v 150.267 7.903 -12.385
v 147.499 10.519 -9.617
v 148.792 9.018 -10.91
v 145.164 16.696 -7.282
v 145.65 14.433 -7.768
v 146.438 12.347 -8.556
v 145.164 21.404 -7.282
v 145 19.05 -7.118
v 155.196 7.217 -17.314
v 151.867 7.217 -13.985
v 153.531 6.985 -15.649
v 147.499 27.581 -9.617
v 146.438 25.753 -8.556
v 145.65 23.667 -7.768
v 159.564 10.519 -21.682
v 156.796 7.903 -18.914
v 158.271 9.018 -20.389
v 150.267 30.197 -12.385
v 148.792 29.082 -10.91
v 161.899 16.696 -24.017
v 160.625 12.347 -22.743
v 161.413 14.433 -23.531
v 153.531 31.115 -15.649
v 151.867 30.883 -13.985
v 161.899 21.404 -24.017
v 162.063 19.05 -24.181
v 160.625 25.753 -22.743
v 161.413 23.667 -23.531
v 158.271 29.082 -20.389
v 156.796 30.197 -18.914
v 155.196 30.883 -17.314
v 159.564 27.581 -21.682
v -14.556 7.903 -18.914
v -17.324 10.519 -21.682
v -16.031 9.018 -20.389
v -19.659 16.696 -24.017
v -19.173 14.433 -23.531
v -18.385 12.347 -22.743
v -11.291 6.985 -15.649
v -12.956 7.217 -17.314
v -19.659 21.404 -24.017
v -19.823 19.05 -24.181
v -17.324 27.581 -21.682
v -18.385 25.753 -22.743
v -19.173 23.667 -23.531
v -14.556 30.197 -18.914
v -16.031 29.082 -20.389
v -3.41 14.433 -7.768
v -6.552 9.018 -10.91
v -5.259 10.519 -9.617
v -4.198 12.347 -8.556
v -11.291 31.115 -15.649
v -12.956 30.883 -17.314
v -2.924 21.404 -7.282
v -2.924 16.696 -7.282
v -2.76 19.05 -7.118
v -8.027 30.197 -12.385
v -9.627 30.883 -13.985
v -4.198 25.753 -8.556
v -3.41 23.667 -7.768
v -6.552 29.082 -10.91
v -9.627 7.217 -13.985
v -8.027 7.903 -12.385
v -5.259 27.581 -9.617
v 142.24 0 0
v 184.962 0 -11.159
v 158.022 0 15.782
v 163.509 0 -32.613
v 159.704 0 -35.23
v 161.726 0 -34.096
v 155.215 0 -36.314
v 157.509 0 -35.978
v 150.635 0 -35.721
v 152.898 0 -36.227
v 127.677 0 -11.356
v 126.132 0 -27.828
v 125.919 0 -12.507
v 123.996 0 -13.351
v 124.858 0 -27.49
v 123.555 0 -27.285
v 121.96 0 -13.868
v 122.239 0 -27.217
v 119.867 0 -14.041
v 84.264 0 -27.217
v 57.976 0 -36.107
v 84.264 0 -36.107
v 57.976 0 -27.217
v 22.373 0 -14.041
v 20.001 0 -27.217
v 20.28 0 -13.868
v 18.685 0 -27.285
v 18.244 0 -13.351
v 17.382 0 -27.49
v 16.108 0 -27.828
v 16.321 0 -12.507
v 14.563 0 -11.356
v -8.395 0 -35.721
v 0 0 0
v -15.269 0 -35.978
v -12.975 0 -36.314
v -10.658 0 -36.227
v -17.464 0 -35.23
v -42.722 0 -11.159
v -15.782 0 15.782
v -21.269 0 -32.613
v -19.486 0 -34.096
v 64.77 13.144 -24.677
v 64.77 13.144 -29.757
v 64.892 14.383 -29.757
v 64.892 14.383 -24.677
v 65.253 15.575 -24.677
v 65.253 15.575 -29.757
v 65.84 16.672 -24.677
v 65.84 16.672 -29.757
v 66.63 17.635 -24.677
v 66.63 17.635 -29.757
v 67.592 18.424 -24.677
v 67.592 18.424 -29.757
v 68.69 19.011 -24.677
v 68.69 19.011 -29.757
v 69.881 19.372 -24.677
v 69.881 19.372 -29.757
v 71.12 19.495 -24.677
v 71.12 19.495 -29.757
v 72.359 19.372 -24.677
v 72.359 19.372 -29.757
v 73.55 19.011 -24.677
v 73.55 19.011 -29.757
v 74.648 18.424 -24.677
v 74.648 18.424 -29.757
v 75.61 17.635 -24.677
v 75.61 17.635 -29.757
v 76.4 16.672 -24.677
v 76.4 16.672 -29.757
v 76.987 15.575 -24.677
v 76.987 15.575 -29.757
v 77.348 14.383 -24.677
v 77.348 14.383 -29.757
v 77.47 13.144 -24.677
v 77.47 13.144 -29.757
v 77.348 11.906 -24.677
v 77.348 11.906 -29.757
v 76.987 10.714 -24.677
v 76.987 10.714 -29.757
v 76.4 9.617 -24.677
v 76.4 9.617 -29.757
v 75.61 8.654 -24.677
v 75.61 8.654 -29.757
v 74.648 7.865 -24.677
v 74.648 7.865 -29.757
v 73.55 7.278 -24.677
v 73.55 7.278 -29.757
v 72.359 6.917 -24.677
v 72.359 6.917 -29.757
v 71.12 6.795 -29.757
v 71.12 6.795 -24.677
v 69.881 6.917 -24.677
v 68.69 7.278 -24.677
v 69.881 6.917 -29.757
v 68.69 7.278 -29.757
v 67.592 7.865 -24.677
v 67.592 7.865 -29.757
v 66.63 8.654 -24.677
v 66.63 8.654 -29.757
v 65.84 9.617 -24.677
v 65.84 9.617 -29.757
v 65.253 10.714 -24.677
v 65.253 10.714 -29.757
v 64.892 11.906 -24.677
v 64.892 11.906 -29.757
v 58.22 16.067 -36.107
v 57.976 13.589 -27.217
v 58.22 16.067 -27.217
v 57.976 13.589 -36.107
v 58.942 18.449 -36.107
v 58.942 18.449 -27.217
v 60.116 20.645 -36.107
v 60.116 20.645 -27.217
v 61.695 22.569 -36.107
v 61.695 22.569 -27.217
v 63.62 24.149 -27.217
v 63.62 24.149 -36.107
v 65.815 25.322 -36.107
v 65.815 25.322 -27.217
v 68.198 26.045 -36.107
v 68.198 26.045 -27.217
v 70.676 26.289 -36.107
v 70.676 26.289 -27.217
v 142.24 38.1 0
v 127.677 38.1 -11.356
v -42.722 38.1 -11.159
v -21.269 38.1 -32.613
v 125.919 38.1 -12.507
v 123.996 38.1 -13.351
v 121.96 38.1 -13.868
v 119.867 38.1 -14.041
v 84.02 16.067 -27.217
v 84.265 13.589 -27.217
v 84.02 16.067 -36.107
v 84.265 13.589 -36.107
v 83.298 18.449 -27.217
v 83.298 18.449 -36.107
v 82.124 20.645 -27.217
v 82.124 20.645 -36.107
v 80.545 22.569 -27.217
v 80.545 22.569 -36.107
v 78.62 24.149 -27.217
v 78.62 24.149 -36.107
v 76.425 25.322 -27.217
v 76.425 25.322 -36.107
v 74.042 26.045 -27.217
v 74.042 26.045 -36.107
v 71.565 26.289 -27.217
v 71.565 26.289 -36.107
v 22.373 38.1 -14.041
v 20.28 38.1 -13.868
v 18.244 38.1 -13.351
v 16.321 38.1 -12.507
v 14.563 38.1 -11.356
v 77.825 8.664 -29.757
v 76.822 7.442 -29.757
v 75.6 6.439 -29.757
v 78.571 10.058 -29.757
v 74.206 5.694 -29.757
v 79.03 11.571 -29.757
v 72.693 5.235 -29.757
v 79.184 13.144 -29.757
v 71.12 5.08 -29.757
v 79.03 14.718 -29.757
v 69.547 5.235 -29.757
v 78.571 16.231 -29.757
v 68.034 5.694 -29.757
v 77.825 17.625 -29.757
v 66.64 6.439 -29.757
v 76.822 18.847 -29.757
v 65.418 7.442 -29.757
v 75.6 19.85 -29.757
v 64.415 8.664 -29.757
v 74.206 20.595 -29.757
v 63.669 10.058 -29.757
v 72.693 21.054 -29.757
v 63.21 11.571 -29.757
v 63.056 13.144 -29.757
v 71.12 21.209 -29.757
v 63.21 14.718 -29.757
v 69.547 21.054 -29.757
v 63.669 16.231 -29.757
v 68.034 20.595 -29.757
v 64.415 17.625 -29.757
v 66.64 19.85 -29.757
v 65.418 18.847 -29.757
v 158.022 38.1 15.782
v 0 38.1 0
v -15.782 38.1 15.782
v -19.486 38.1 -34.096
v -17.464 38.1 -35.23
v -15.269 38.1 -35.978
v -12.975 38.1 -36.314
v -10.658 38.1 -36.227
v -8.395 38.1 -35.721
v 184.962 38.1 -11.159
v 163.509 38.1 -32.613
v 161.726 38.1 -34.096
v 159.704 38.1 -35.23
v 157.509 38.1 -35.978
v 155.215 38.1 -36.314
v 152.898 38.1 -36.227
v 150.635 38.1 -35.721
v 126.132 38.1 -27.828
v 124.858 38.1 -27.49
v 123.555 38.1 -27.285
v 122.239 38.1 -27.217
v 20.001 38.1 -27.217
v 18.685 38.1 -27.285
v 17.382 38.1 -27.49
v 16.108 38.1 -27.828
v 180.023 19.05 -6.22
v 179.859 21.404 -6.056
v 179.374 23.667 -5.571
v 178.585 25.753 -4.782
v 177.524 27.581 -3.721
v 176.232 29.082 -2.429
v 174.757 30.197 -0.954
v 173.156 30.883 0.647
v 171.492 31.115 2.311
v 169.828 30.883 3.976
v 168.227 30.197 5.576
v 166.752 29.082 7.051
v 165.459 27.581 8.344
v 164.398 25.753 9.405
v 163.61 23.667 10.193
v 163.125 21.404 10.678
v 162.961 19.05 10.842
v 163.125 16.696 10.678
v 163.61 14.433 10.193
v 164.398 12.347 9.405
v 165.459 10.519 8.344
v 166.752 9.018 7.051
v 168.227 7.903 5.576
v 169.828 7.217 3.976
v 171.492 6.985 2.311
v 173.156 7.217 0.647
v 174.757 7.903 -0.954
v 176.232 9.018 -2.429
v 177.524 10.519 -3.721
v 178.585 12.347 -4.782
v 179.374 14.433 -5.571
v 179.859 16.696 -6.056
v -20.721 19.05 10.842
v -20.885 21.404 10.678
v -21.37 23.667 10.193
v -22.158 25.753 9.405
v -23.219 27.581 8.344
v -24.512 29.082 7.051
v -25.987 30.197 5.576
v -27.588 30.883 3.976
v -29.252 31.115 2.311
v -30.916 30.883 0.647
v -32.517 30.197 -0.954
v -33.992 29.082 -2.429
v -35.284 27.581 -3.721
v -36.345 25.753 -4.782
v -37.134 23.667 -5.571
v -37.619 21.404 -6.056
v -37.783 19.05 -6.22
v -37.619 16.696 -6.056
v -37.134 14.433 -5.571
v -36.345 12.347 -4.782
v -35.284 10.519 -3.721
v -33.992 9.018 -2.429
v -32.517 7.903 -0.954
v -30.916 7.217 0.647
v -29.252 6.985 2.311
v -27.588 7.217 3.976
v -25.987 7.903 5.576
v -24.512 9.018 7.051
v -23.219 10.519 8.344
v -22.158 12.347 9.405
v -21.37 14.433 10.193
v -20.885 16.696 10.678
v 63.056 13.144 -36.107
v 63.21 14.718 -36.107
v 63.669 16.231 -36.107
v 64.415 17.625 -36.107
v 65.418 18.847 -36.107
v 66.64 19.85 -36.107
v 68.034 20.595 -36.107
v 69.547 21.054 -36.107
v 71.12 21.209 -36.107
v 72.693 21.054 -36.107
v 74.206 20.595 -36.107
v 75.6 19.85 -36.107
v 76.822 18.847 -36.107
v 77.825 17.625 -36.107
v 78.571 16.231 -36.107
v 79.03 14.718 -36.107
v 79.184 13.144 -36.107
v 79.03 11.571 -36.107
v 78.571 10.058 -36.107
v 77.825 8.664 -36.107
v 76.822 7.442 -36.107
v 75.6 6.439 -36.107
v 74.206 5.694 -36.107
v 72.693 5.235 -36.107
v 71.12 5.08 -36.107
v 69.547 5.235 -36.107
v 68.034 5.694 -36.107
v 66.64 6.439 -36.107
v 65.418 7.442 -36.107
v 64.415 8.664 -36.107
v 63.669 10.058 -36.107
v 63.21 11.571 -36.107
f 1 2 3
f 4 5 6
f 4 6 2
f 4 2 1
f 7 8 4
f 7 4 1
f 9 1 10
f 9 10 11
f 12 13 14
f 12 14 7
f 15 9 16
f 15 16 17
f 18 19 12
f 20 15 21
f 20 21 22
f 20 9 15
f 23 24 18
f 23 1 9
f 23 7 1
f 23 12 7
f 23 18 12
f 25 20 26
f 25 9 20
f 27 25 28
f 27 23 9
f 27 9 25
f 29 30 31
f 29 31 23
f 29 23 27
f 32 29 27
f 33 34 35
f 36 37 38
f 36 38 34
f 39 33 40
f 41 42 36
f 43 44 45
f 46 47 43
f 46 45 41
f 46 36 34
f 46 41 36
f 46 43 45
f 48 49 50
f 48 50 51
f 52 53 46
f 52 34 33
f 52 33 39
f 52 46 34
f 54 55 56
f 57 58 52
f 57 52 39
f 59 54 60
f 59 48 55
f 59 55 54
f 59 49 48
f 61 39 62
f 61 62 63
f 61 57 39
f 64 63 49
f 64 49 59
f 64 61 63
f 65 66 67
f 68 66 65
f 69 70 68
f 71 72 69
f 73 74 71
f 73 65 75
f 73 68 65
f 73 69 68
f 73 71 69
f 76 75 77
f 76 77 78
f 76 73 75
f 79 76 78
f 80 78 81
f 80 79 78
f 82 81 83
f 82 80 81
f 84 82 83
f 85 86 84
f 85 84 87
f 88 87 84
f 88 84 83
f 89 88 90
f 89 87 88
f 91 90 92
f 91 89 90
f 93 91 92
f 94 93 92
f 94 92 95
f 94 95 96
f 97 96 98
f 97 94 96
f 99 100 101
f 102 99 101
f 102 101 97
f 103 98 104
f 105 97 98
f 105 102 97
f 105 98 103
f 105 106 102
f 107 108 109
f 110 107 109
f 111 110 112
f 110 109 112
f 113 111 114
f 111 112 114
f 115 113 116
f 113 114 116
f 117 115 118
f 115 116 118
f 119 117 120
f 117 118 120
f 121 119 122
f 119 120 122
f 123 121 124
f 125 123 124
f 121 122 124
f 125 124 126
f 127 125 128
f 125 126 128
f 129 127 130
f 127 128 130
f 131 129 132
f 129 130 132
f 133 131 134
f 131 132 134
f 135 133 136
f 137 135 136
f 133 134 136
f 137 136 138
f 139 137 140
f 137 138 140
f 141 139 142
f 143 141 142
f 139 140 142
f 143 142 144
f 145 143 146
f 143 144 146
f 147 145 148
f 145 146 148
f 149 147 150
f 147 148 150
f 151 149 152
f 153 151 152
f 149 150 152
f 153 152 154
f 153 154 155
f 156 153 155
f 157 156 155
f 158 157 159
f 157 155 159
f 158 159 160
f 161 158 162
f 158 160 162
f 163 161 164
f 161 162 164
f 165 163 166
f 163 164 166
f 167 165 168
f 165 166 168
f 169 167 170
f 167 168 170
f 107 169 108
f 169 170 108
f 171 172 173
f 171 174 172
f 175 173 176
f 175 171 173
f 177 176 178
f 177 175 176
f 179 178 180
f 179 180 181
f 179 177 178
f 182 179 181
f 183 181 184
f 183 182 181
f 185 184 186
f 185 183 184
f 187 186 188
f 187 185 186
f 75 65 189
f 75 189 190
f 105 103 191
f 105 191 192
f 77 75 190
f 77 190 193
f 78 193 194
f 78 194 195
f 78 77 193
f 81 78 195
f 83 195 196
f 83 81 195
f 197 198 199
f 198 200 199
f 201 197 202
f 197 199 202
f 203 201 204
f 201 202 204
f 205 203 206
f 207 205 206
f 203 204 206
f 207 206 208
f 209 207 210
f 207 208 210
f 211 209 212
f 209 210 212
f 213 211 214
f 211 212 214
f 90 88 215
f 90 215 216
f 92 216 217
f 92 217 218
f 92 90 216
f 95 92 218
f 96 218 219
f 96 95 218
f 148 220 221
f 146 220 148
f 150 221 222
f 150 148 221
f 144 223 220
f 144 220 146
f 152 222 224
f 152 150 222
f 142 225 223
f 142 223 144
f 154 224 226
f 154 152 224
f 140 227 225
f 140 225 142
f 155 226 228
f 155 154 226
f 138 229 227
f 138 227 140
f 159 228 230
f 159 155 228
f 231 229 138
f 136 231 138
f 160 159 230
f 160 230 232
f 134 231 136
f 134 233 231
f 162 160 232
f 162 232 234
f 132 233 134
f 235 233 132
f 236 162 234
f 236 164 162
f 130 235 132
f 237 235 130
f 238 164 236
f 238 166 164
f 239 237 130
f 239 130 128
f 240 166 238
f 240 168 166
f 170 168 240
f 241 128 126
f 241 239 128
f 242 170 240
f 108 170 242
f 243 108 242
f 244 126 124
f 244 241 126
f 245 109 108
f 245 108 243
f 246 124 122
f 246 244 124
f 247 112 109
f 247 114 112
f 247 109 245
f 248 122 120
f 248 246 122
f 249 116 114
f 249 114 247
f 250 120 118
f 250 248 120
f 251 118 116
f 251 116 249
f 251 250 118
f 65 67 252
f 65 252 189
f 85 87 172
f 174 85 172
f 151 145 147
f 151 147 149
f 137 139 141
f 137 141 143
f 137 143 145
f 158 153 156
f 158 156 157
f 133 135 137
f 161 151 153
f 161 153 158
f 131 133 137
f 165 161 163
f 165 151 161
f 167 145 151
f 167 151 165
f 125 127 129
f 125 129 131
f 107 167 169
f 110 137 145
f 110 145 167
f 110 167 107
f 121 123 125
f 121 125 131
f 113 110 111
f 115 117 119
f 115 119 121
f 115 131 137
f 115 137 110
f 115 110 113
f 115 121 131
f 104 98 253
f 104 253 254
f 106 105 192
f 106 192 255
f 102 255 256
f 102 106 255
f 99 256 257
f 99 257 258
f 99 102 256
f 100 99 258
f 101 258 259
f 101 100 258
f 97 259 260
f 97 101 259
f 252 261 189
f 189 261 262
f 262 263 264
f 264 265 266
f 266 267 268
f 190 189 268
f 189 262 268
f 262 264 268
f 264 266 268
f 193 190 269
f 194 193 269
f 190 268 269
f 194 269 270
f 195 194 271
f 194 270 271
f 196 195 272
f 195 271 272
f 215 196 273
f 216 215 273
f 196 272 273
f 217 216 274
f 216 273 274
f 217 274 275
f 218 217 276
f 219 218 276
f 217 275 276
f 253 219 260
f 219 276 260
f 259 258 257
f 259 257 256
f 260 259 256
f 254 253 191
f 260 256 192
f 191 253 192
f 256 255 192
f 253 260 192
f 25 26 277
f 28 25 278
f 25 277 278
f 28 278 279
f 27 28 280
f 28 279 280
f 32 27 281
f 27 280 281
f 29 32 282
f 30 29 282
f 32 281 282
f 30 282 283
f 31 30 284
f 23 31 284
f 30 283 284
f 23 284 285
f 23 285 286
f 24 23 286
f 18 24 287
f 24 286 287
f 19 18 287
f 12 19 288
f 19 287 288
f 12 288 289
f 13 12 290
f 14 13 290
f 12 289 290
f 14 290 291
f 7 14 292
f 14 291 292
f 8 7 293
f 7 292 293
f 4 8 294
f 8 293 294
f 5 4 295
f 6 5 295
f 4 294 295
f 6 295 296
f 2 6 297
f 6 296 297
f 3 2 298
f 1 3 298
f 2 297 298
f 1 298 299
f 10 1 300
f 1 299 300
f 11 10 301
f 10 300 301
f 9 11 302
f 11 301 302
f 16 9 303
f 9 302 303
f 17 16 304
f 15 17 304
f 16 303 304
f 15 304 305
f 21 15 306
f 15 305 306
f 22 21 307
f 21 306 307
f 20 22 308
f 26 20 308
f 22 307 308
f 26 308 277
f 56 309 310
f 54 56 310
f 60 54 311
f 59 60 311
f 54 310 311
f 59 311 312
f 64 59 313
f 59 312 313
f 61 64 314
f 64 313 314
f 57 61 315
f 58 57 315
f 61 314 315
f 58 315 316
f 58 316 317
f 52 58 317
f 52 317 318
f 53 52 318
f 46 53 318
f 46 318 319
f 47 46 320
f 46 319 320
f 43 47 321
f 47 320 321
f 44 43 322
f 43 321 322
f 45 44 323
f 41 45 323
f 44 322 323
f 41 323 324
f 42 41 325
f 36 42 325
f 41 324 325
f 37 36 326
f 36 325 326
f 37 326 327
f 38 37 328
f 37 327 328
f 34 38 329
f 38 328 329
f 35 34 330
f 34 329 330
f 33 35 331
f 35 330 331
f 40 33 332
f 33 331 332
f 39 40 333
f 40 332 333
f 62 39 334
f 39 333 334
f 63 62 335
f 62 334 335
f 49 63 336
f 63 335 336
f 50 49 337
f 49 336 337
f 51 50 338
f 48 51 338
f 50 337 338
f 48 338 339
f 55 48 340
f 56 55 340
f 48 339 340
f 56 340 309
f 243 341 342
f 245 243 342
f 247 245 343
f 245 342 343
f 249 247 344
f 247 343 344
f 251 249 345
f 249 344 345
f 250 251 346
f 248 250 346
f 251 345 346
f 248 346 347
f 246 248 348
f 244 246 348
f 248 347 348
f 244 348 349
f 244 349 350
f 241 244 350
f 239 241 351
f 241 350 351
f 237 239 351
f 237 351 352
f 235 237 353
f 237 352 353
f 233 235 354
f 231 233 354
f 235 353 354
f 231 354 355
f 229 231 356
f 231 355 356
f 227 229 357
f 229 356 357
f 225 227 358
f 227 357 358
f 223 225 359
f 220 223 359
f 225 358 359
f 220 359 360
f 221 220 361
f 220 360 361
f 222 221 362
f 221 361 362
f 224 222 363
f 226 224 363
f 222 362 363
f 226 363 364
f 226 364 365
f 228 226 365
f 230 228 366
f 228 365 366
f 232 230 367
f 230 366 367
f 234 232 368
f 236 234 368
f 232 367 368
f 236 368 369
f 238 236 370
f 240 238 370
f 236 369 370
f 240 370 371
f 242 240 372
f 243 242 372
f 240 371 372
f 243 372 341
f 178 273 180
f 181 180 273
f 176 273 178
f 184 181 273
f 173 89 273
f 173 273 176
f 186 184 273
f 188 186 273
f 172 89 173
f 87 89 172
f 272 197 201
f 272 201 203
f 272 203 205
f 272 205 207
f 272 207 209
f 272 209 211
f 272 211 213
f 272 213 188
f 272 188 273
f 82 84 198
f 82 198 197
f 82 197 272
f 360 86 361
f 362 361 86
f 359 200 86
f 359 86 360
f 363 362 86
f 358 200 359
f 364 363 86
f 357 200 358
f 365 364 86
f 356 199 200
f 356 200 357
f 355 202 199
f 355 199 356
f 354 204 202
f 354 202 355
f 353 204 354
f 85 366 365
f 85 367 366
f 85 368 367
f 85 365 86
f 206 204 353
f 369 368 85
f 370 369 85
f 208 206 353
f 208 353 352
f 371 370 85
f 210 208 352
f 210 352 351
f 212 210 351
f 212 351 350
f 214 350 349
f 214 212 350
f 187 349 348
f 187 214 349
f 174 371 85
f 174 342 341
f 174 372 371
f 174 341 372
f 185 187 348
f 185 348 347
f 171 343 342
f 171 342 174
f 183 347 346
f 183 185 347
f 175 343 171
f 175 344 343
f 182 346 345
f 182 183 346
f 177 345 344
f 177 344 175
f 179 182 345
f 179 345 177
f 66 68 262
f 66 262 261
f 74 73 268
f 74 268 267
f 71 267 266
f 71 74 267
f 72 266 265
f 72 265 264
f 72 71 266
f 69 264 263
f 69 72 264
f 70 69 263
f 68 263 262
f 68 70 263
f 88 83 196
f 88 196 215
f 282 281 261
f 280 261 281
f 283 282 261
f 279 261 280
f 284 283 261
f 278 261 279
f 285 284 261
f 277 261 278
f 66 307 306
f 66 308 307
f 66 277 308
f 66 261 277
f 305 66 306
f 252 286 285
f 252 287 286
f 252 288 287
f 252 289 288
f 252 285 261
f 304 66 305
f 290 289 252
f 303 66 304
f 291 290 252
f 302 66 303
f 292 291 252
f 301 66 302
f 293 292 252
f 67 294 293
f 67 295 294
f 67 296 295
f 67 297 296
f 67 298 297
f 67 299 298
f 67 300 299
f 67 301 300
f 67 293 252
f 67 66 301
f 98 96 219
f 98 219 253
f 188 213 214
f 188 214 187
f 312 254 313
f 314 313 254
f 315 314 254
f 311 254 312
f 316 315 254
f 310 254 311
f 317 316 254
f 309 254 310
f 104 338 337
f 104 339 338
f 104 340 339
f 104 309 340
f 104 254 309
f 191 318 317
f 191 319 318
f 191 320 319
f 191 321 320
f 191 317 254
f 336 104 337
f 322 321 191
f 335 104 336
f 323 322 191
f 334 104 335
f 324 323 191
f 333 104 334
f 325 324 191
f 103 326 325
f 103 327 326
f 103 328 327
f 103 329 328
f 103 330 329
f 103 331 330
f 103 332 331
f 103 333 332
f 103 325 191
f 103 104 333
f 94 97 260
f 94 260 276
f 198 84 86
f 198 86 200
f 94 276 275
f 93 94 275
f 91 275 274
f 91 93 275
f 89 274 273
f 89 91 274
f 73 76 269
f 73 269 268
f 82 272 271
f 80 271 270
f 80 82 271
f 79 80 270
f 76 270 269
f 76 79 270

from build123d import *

# Parameters (mm, degrees)
BOSS_EXTRUDE1_DEPTH = 38.1
SKETCH2_R           = 12.065
CUT_EXTRUDE1_DEPTH  = 25.4
SKETCH7_R           = 12.065
CUT_EXTRUDE2_DEPTH  = 25.4
SKETCH9_W           = 26.289
SKETCH9_H           = 26.289
BOSS_EXTRUDE3_DEPTH = 8.89
SKETCH10_R          = 8.0645
CUT_EXTRUDE3_DEPTH  = 6.35
SKETCH12_R          = 6.35
CUT_EXTRUDE5_DEPTH  = 5.08
FILLET1_R           = 12.7


with BuildPart() as part:
    # Sketch1 → Boss-Extrude1 (new body)
    with BuildSketch(Plane(origin=(0, 0, 0), x_dir=(1, 0, 0), z_dir=(0, 1, 0))):
        with BuildLine():
            Line((-8.394951703, 35.720764917), (16.107614613, 27.828435078))
            ThreePointArc((16.107614613, 27.828435078), (18.03059142, 27.370657964), (20.001310729, 27.216823331))
            Line((20.001310729, 27.216823331), (122.238689271, 27.216823331))
            ThreePointArc((122.238689271, 27.216823331), (124.20940858, 27.370657964), (126.132385387, 27.828435078))
            Line((126.132385387, 27.828435078), (150.634951703, 35.720764917))
            ThreePointArc((150.634951703, 35.720764917), (157.509150211, 35.977683688), (163.508903941, 32.612632786))
            Line((163.508903941, 32.612632786), (184.96230509, 11.159231637))
            Line((184.96230509, 11.159231637), (158.021536726, -15.781536726))
            Line((158.021536726, -15.781536726), (142.24, 0))
            Line((142.24, 0), (127.676821583, 11.356327171))
            ThreePointArc((127.676821583, 11.356327171), (123.996342172, 13.351360126), (119.867179962, 14.041363479))
            Line((119.867179962, 14.041363479), (22.372820038, 14.041363479))
            ThreePointArc((22.372820038, 14.041363479), (18.243657828, 13.351360126), (14.563178417, 11.356327171))
            Line((14.563178417, 11.356327171), (0, 0))
            Line((0, 0), (-15.781536726, -15.781536726))
            Line((-15.781536726, -15.781536726), (-42.72230509, 11.159231637))
            Line((-42.72230509, 11.159231637), (-21.268903941, 32.612632786))
            ThreePointArc((-21.268903941, 32.612632786), (-15.269150211, 35.977683688), (-8.394951703, 35.720764917))
        make_face()
    extrude(amount=BOSS_EXTRUDE1_DEPTH)

    # Sketch2 → Cut-Extrude1 (cut)
    with BuildSketch(Plane(origin=(-15.781536726, 0, 15.781536726), x_dir=(0.7071067811865477, 0, 0.7071067811865475), z_dir=(-0.7071067811865475, 0, 0.7071067811865477))):
        with Locations((-19.05, 19.05)):
            Circle(SKETCH2_R)
    extrude(amount=-CUT_EXTRUDE1_DEPTH, mode=Mode.SUBTRACT)

    # Sketch7 → Cut-Extrude2 (cut)
    with BuildSketch(Plane(origin=(86.901536726, 0, 86.901536726), x_dir=(0.7071067811865472, 0, -0.7071067811865478), z_dir=(0.7071067811865478, 0, 0.7071067811865472))):
        with Locations((119.628868556, 19.05)):
            Circle(SKETCH7_R)
    extrude(amount=-CUT_EXTRUDE2_DEPTH, mode=Mode.SUBTRACT)

    # Sketch9 → Boss-Extrude3 (add)
    with BuildSketch(Plane(origin=(0, 0, -27.216823331), x_dir=(-1, 0, 0), z_dir=(0, 0, -1))):
        with Locations((-71.12, 13.1445)):
            Rectangle(SKETCH9_W, SKETCH9_H)
    extrude(amount=BOSS_EXTRUDE3_DEPTH)

    # Sketch10 → Cut-Extrude3 (cut)
    with BuildSketch(Plane(origin=(0, 0, -36.106823331), x_dir=(-1, 0, 0), z_dir=(0, 0, -1))):
        with Locations((-71.12, 13.1445)):
            Circle(SKETCH10_R)
    extrude(amount=-CUT_EXTRUDE3_DEPTH, mode=Mode.SUBTRACT)

    # Sketch12 → Cut-Extrude5 (cut)
    with BuildSketch(Plane(origin=(0, 0, -29.756823331), x_dir=(-1, 0, 0), z_dir=(0, 0, -1))):
        with Locations((-71.12, 13.1445)):
            Circle(SKETCH12_R)
    extrude(amount=-CUT_EXTRUDE5_DEPTH, mode=Mode.SUBTRACT)

    # Fillet1
    fillet1_edges = [part.edges().sort_by_distance(p)[0] for p in [
        (57.9755, 26.289, -31.661823331),
        (84.2645, 26.289, -31.661823331),
    ]]
    fillet(fillet1_edges, radius=FILLET1_R)


solid = part.part
